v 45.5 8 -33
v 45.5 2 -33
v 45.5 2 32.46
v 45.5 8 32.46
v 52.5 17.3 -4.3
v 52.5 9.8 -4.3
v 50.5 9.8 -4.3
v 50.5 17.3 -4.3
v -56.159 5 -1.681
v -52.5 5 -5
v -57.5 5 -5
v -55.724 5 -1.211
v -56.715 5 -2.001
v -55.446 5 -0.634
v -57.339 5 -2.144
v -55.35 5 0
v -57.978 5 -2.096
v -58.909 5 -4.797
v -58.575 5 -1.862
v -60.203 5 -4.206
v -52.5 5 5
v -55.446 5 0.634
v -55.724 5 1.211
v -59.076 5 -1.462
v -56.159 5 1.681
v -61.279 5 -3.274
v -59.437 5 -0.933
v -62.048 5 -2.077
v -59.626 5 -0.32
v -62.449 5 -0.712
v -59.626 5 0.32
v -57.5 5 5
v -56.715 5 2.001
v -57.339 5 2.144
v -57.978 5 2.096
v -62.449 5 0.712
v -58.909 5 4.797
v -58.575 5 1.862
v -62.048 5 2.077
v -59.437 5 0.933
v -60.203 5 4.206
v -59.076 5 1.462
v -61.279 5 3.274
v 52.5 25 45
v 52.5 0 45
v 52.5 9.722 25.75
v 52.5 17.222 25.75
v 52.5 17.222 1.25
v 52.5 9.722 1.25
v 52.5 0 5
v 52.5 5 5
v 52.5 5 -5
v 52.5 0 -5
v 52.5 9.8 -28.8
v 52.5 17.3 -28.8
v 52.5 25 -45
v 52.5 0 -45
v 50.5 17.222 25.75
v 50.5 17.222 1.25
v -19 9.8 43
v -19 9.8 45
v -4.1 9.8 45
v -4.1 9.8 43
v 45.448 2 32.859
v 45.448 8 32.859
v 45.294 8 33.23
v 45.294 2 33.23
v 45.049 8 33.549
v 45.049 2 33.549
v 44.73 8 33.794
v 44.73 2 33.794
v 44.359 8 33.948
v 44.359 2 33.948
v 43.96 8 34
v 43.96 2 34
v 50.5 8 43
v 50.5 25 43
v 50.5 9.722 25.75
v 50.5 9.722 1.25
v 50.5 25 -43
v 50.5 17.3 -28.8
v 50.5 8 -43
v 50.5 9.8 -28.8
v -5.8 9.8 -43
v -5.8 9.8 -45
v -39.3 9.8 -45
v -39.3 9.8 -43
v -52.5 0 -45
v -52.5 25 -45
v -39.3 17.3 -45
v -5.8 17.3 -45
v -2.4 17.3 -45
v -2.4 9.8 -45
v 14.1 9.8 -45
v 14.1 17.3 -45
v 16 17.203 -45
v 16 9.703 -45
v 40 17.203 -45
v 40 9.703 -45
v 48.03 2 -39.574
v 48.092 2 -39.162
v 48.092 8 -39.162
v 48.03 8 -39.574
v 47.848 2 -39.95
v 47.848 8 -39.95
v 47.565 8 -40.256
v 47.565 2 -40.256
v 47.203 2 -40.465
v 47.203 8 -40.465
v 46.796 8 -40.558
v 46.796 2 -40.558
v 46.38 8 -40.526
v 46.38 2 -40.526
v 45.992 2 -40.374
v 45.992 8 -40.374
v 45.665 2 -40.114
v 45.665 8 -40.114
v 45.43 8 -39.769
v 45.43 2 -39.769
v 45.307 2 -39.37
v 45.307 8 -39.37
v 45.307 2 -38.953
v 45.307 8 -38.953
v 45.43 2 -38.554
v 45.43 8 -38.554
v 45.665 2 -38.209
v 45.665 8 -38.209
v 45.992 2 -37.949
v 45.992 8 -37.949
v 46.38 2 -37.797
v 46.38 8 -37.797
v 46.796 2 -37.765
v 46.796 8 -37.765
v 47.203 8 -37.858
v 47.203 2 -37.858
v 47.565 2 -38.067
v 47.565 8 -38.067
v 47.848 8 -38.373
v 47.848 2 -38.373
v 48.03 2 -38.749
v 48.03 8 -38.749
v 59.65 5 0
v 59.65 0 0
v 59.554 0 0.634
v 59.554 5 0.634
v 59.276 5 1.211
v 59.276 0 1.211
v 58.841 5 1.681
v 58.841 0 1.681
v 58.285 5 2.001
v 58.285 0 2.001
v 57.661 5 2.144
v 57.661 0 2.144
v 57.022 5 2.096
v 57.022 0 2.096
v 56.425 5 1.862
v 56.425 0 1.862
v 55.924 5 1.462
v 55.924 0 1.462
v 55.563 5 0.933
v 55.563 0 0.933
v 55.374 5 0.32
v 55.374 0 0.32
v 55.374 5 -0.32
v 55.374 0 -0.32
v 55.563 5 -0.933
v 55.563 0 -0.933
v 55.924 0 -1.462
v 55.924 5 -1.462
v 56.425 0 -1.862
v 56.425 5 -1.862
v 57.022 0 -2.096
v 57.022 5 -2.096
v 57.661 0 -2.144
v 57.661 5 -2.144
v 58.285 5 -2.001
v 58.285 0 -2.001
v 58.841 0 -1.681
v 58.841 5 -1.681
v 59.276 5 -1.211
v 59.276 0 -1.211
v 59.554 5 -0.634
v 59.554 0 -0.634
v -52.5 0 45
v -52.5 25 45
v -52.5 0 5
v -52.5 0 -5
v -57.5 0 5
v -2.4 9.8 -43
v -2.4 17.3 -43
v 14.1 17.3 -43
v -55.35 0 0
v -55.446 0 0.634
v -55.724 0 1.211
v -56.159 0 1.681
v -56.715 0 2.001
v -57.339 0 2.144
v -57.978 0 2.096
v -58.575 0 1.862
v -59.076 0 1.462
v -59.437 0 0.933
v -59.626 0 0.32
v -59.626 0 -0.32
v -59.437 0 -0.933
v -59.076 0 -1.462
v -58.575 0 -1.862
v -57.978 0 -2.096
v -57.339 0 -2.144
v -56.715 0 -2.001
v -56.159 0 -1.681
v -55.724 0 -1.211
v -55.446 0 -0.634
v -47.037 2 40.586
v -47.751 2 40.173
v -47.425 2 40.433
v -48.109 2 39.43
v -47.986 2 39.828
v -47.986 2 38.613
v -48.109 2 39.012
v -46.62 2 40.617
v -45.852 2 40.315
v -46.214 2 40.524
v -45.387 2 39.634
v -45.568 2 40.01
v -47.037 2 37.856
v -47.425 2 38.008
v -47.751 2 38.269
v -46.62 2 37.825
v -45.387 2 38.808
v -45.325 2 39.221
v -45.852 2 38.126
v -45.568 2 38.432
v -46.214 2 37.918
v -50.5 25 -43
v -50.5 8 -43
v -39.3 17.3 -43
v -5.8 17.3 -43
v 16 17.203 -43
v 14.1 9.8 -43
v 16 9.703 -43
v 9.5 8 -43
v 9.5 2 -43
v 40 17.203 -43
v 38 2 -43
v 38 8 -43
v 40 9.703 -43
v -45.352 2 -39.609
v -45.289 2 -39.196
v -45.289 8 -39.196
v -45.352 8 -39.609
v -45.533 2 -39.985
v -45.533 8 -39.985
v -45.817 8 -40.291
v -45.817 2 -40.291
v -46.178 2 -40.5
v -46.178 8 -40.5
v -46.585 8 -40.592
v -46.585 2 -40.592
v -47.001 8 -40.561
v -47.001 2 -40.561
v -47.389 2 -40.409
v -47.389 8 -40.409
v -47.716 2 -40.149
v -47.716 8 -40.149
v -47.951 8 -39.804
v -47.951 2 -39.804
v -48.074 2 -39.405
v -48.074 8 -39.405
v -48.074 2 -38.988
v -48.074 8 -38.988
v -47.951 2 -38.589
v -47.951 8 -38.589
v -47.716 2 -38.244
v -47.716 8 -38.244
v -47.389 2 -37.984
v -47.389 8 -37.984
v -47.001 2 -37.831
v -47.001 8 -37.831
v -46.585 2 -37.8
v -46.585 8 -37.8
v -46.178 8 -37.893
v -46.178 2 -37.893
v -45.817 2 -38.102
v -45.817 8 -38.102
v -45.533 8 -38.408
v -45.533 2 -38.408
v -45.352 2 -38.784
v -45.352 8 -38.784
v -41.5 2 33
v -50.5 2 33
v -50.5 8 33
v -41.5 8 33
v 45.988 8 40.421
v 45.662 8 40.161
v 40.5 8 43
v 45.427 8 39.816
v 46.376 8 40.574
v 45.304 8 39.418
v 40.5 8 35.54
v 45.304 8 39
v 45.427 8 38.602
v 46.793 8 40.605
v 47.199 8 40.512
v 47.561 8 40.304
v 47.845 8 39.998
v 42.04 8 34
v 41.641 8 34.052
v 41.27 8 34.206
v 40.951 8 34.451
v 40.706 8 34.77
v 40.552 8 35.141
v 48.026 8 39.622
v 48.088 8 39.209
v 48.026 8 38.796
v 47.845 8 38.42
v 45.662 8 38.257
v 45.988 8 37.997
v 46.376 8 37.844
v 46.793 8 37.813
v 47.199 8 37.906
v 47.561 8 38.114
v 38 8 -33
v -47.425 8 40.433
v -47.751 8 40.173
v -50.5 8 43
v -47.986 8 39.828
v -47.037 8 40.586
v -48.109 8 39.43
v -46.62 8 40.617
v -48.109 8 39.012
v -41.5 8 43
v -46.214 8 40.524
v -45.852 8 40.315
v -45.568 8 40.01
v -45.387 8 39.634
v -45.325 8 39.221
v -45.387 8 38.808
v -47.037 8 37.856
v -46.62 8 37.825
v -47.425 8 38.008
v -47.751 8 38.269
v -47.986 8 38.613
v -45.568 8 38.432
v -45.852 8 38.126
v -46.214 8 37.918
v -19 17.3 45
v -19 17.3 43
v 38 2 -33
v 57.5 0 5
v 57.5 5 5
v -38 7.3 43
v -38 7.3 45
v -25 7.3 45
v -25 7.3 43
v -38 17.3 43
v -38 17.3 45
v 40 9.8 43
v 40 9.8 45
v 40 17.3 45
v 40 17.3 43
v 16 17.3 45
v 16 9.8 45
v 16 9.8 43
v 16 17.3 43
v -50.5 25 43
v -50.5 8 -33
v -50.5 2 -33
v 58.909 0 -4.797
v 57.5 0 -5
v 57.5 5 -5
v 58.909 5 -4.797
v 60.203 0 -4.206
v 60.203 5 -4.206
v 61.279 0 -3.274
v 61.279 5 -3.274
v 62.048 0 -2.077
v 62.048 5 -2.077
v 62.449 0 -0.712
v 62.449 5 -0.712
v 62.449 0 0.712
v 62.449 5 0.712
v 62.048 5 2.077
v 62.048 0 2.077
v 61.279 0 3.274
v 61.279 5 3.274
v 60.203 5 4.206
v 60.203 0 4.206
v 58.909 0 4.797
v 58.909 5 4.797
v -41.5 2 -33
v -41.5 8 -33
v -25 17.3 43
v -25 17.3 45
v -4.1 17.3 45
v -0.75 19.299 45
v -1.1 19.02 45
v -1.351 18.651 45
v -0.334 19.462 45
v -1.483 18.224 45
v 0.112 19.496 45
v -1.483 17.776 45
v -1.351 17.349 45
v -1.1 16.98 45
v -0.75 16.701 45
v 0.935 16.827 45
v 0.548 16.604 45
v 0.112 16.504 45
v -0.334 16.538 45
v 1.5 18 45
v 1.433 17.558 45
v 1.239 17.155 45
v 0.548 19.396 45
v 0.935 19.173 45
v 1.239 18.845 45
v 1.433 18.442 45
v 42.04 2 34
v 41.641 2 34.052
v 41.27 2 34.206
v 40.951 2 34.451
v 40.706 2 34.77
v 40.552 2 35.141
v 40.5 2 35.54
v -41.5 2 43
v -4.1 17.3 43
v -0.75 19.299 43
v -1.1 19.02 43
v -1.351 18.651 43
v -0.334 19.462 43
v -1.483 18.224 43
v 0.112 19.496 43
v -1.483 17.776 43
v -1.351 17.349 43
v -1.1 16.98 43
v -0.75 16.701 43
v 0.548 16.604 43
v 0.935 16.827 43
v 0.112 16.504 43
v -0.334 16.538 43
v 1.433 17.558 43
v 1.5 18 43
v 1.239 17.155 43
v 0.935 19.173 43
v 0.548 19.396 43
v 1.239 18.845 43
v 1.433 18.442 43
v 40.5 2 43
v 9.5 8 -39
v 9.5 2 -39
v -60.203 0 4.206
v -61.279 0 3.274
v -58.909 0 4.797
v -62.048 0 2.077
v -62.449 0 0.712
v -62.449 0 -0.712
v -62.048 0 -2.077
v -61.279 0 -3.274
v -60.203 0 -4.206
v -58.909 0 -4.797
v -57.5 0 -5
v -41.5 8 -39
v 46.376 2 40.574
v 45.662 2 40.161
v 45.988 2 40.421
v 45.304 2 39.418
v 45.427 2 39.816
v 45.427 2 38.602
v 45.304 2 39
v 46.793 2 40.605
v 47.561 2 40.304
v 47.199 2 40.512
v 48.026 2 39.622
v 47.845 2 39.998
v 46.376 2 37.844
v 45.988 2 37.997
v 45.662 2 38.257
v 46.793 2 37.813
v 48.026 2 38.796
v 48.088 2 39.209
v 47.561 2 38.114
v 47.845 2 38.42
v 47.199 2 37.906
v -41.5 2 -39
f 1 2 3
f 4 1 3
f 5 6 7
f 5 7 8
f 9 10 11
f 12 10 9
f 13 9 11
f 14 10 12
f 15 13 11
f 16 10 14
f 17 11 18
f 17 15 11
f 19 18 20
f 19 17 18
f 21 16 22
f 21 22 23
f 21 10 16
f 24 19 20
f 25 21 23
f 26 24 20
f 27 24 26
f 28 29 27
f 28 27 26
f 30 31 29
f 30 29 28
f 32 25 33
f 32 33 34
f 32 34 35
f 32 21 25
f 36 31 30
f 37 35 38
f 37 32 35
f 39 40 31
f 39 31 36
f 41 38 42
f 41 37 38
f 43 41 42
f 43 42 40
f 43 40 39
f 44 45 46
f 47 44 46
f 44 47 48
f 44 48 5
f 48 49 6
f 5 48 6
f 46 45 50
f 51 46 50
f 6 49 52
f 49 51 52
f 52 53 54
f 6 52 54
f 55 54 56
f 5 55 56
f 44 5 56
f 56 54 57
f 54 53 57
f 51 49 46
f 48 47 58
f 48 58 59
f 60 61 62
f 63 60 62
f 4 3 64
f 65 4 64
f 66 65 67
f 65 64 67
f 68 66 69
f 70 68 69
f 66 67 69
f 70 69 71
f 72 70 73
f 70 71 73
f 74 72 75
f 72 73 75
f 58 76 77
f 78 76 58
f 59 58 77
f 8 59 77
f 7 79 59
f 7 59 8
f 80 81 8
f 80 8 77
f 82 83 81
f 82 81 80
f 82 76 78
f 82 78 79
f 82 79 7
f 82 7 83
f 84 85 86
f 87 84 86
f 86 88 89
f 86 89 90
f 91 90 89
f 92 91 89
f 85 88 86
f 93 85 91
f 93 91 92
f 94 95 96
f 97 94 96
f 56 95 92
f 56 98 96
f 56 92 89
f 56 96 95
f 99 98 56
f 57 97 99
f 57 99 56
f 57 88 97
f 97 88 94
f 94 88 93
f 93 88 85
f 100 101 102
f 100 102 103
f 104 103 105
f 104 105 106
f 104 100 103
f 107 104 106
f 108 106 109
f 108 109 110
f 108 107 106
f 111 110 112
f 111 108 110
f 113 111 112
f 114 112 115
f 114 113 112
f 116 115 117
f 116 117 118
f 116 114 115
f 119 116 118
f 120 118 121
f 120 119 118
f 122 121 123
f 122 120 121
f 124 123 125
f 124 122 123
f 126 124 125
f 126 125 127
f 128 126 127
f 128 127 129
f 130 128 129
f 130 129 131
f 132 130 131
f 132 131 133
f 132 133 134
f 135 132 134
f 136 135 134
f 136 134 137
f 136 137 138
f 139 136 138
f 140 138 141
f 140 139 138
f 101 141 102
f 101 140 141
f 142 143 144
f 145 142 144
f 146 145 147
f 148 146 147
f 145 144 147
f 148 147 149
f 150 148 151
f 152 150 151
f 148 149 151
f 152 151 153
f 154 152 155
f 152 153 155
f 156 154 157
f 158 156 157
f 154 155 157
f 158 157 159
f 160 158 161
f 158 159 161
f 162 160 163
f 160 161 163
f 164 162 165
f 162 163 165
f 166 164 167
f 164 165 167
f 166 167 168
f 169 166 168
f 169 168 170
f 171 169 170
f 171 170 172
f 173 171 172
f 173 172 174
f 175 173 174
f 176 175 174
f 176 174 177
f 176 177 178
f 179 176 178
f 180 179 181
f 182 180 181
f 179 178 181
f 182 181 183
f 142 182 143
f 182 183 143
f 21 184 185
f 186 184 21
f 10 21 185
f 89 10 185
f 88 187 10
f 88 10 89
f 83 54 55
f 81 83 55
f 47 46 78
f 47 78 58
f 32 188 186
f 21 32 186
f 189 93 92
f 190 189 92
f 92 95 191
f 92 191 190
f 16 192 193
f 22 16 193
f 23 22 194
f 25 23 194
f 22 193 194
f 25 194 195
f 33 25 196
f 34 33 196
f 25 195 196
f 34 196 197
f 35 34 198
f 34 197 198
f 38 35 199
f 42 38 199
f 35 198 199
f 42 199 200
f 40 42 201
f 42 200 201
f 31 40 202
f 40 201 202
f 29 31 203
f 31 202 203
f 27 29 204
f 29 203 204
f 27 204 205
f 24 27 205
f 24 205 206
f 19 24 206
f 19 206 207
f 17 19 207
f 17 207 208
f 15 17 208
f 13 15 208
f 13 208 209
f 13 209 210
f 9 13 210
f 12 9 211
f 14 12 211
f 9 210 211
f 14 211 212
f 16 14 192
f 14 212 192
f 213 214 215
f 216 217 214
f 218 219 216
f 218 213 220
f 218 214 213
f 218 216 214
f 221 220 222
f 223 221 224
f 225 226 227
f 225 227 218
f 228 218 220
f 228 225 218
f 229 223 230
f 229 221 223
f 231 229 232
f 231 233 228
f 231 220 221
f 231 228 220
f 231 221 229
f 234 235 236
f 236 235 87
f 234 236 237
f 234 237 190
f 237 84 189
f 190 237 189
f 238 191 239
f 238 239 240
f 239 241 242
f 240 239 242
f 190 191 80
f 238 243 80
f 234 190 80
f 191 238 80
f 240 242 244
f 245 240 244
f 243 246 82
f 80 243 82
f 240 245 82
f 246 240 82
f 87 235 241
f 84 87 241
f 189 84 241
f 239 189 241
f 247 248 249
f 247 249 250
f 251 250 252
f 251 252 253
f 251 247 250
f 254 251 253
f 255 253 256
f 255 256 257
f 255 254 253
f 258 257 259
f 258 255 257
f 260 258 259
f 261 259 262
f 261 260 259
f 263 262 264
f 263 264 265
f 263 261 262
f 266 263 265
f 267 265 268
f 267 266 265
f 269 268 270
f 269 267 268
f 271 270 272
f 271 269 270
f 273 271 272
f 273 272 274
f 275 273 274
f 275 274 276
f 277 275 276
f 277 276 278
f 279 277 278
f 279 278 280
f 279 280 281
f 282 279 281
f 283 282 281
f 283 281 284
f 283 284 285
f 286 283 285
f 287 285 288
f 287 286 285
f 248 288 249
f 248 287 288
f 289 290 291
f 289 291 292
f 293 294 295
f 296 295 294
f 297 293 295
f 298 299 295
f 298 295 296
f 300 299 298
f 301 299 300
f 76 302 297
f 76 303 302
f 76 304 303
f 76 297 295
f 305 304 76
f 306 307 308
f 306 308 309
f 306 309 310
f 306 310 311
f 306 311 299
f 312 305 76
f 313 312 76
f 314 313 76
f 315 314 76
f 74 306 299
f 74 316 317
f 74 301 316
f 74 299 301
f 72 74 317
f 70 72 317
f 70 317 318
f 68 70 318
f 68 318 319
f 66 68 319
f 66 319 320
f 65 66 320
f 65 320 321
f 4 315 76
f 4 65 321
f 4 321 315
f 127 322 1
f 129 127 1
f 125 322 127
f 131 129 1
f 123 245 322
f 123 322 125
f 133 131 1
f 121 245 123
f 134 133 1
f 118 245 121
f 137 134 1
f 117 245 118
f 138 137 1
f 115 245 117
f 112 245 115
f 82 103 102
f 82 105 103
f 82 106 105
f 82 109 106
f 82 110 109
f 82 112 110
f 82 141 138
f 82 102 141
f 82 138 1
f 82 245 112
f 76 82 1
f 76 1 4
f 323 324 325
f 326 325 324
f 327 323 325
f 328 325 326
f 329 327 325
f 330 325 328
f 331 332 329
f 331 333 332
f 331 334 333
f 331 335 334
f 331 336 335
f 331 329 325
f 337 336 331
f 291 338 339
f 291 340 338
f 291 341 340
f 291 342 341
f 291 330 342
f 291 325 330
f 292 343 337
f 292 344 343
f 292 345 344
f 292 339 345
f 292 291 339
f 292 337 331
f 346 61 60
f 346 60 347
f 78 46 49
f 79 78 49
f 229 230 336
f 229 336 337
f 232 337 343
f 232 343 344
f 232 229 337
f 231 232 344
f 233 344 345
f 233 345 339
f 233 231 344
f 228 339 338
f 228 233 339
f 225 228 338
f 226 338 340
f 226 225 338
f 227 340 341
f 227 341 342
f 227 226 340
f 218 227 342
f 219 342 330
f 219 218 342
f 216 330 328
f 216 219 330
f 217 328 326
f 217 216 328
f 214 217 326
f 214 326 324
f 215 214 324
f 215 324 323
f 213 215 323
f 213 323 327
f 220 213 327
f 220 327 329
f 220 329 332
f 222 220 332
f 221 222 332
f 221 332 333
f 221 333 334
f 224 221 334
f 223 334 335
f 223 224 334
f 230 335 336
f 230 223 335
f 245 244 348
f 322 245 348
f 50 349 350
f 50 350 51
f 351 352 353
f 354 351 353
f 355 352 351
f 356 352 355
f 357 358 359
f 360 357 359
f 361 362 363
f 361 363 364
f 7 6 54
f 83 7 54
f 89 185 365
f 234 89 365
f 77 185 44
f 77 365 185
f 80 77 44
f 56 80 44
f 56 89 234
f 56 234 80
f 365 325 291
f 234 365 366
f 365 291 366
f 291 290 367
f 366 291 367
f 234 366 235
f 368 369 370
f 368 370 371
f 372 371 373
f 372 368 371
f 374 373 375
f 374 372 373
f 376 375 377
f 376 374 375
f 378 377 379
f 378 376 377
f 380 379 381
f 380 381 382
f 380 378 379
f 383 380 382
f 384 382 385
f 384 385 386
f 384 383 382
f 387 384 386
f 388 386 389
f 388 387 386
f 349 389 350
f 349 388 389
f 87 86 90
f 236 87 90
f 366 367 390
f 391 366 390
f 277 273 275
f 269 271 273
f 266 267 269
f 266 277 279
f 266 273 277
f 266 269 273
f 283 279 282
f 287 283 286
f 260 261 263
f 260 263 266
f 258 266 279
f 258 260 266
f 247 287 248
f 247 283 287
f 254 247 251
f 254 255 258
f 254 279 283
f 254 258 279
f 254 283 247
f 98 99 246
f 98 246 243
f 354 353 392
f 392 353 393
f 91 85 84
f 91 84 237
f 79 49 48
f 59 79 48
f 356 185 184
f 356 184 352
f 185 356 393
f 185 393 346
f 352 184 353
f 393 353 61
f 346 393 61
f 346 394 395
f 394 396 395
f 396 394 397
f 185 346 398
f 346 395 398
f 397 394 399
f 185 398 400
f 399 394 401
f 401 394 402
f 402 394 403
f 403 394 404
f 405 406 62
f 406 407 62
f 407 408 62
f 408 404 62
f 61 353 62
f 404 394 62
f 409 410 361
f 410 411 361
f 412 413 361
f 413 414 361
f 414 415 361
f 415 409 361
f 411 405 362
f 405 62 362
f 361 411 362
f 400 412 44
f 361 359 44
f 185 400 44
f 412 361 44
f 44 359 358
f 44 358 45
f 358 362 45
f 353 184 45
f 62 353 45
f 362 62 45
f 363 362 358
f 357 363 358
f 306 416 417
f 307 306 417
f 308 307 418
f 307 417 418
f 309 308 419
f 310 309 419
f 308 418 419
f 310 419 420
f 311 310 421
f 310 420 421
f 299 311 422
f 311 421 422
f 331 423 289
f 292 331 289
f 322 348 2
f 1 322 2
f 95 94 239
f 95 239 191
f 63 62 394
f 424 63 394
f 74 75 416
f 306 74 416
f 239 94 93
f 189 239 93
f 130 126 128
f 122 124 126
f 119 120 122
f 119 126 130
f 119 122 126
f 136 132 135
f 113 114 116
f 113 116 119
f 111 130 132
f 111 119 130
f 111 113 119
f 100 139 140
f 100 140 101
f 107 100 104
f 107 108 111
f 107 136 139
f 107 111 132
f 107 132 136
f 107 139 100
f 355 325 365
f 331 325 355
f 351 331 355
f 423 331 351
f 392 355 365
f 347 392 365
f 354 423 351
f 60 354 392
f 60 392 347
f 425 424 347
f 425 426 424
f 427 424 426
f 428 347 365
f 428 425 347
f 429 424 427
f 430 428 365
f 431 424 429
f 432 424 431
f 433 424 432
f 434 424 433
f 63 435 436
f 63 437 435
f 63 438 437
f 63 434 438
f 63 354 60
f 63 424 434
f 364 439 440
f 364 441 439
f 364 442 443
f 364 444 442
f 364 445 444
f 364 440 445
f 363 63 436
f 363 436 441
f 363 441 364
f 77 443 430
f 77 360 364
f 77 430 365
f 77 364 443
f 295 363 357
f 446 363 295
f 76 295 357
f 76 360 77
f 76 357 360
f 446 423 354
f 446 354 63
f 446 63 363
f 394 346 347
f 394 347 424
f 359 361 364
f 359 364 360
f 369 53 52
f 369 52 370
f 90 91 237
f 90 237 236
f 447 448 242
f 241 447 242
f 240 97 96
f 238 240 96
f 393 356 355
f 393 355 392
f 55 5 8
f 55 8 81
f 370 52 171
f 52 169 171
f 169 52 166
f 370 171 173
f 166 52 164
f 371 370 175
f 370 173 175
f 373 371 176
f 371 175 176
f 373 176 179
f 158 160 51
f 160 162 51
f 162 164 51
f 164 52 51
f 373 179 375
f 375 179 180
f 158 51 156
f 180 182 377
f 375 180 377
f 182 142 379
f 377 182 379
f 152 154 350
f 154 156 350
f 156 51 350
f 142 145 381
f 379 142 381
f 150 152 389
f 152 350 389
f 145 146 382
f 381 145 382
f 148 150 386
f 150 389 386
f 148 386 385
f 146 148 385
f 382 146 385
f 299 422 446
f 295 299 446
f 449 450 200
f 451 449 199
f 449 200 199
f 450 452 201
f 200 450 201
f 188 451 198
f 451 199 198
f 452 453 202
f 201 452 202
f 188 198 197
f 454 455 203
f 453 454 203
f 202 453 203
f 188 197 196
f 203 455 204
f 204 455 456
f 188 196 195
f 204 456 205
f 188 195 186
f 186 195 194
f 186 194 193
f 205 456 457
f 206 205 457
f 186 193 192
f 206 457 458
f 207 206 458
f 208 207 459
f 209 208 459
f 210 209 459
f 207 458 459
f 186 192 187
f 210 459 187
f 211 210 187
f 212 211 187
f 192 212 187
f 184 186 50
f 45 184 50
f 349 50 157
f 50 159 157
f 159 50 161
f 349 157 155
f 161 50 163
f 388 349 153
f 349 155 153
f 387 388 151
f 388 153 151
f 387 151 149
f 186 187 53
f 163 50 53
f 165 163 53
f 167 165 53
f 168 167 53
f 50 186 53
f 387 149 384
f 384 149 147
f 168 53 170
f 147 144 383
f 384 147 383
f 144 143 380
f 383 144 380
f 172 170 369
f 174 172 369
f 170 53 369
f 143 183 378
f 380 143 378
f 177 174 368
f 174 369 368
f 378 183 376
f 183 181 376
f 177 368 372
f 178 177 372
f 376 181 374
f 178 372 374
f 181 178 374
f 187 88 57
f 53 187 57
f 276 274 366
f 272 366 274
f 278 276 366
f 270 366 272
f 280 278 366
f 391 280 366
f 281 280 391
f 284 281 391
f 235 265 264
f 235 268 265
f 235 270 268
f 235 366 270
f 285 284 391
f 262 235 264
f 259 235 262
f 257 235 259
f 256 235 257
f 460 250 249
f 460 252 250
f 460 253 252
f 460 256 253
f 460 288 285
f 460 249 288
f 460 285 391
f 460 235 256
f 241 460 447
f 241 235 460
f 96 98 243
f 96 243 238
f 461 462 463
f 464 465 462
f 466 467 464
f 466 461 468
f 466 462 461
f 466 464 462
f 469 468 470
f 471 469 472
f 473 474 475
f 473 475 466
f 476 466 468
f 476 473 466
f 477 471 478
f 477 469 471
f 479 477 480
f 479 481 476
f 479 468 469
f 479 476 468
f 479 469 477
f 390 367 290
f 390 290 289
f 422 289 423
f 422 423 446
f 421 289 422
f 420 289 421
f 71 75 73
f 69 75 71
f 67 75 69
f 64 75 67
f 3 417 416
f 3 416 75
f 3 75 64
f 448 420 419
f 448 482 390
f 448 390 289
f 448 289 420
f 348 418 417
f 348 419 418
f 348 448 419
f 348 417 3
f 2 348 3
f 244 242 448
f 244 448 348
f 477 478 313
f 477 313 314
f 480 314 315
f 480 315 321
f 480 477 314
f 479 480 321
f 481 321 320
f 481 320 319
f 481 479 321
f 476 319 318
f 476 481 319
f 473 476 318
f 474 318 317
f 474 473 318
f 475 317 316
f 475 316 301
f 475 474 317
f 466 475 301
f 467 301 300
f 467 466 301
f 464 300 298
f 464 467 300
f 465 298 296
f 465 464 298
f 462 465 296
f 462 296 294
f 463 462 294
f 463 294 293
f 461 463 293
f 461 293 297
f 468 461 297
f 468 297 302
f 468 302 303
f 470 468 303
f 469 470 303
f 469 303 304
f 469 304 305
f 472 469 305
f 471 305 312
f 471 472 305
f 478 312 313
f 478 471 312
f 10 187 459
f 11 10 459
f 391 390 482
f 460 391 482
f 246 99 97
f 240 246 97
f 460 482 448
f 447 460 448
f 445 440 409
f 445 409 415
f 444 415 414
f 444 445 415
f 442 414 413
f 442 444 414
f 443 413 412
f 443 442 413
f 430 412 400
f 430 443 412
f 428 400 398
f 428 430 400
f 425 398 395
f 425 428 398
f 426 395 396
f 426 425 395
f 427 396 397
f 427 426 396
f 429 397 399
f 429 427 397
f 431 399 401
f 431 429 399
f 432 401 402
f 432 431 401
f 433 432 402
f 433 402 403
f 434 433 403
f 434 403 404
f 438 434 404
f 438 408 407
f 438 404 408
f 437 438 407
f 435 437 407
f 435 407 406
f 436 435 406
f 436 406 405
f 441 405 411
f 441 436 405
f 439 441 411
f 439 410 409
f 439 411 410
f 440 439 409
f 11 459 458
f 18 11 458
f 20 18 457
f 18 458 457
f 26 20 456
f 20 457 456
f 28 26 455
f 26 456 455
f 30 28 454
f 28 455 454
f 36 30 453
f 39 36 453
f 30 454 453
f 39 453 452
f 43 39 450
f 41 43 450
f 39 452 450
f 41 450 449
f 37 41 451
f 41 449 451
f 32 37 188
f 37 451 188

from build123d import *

# Parameters (mm, degrees)
SKETCH_1_W          = 105
SKETCH_1_H          = 90
EXTRUDE_1_DEPTH     = 25
SHELL_1_T           = -2
SKETCH_8_R          = 2.15
EXTRUDE_3_DEPTH     = 5
SKETCH_3_W          = 24
SKETCH_3_H          = 7.5
SKETCH_3_W_2        = 14.9
CUT_EXTRUDE_2_DEPTH = 10
SKETCH_5_W          = 24.5
SKETCH_5_H          = 7.5
CUT_EXTRUDE_3_DEPTH = 10
SKETCH_7_W          = 33.5
SKETCH_7_H          = 7.5
SKETCH_7_W_2        = 16.5
SKETCH_7_W_3        = 24
CUT_EXTRUDE_4_DEPTH = 10
SKETCH_9_R          = 1.5
CUT_EXTRUDE_5_DEPTH = 50
SKETCH_2_R          = 1.4
SKETCH_2_W          = 9
SKETCH_2_H          = 10
EXTRUDE_6_DEPTH     = 6
SKETCH_3_8_W        = 24
SKETCH_3_8_H        = 7.5
SKETCH_3_8_W_2      = 14.9
SKETCH_3_8_W_3      = 13
SKETCH_3_8_H_2      = 10
CUT_EXTRUDE_6_DEPTH = 10


with BuildPart() as part:
    # 草图1 → 凸台-拉伸1 (new body)
    with BuildSketch(Plane(origin=(0, 0, 0), x_dir=(1, 0, 0), z_dir=(0, 1, 0))):
        Rectangle(SKETCH_1_W, SKETCH_1_H)
    extrude(amount=EXTRUDE_1_DEPTH)

    # 抽壳1
    shell_1_openings = [part.faces().sort_by_distance(p)[0] for p in [
        (0, 25, 0),
    ]]
    offset(amount=SHELL_1_T, openings=shell_1_openings, kind=Kind.INTERSECTION)

    # 草图8 → 凸台-拉伸3 (add)
    # profile 1 of 2: a face of its own
    with BuildSketch(Plane.XZ):
        with BuildLine():
            Line((-57.5, 5), (-52.5, 5))
            Line((-52.5, 5), (-52.5, -5))
            Line((-52.5, -5), (-57.5, -5))
            ThreePointArc((-57.5, -5), (-62.5, 0), (-57.5, 5))
        make_face()
        with Locations((-57.5, 0)):
            Circle(SKETCH_8_R, mode=Mode.SUBTRACT)
    # profile 2 of 2: a face of its own
    with BuildSketch(Plane.XZ):
        with BuildLine():
            Line((52.5, -5), (57.5, -5))
            ThreePointArc((57.5, -5), (62.5, 0), (57.5, 5))
            Line((57.5, 5), (52.5, 5))
            Line((52.5, 5), (52.5, -5))
        make_face()
        with Locations((57.5, 0)):
            Circle(SKETCH_8_R, mode=Mode.SUBTRACT)
    extrude(amount=-EXTRUDE_3_DEPTH)

    # 草图3 → 切除-拉伸2 (cut)
    with BuildSketch(Plane.XY.offset(45)):
        with Locations((28, 13.55)):
            Rectangle(SKETCH_3_W, SKETCH_3_H)
        with Locations((-11.55, 13.55)):
            Rectangle(SKETCH_3_W_2, SKETCH_3_H)
    extrude(amount=-CUT_EXTRUDE_2_DEPTH, mode=Mode.SUBTRACT)

    # 草图5 → 切除-拉伸3 (cut)
    with BuildSketch(Plane(origin=(52.5, 0, 0), x_dir=(0, 0, -1), z_dir=(1, 0, 0))):
        with Locations((16.55, 13.55)):
            Rectangle(SKETCH_5_W, SKETCH_5_H)
        with Locations((-13.5, 13.471843212)):
            Rectangle(SKETCH_5_W, SKETCH_5_H)
    extrude(amount=-CUT_EXTRUDE_3_DEPTH, mode=Mode.SUBTRACT)

    # 草图7 → 切除-拉伸4 (cut)
    with BuildSketch(Plane(origin=(0, 0, -45), x_dir=(-1, 0, 0), z_dir=(0, 0, -1))):
        with Locations((22.55, 13.55)):
            Rectangle(SKETCH_7_W, SKETCH_7_H)
        with Locations((-5.85, 13.55)):
            Rectangle(SKETCH_7_W_2, SKETCH_7_H)
        with Locations((-28, 13.452632976)):
            Rectangle(SKETCH_7_W_3, SKETCH_7_H)
    extrude(amount=-CUT_EXTRUDE_4_DEPTH, mode=Mode.SUBTRACT)

    # 草图9 → 切除-拉伸5 (cut)
    with BuildSketch(Plane.XY):
        with Locations((0, 18)):
            Circle(SKETCH_9_R)
    extrude(amount=CUT_EXTRUDE_5_DEPTH, mode=Mode.SUBTRACT)

    # 草图2 → 凸台-拉伸6 (add)
    # profile 1 of 3: a face of its own
    with BuildSketch(Plane(origin=(0, 2, 0), x_dir=(1, 0, 0), z_dir=(0, 1, 0))):
        Polygon((-41.5, 33), (-41.5, 39), (9.5, 39), (9.5, 43), (-50.5, 43), (-50.5, 33), align=None)
        with Locations((-46.689481309, 39.196373095)):
            Circle(SKETCH_2_R, mode=Mode.SUBTRACT)
    # profile 2 of 3: a face of its own
    with BuildSketch(Plane(origin=(0, 2, 0), x_dir=(1, 0, 0), z_dir=(0, 1, 0))):
        with Locations((-46, -38)):
            Rectangle(SKETCH_2_W, SKETCH_2_H)
        with Locations((-46.725108279, -39.220894808)):
            Circle(SKETCH_2_R, mode=Mode.SUBTRACT)
    # profile 3 of 3: a face of its own
    with BuildSketch(Plane(origin=(0, 2, 0), x_dir=(1, 0, 0), z_dir=(0, 1, 0))):
        with BuildLine():
            Line((50.5, 43), (38, 43))
            Line((38, 43), (38, 33))
            Line((38, 33), (45.5, 33))
            Line((45.5, 33), (45.5, -32.46))
            ThreePointArc((45.5, -32.46), (45.048944443, -33.548944443), (43.96, -34))
            Line((43.96, -34), (42.04, -34))
            ThreePointArc((42.04, -34), (40.951055557, -34.451055557), (40.5, -35.54))
            Line((40.5, -35.54), (40.5, -43))
            Line((40.5, -43), (50.5, -43))
            Line((50.5, -43), (50.5, 43))
        make_face()
        with Locations((46.687886977, -39.208970538)):
            Circle(SKETCH_2_R, mode=Mode.SUBTRACT)
        with Locations((46.691741848, 39.161577941)):
            Circle(SKETCH_2_R, mode=Mode.SUBTRACT)
    extrude(amount=EXTRUDE_6_DEPTH)

    # 草图3<8> → 切除-拉伸6 (cut)
    with BuildSketch(Plane.XY.offset(45)):
        with Locations((28, 13.55)):
            Rectangle(SKETCH_3_8_W, SKETCH_3_8_H)
        with Locations((-11.55, 13.55)):
            Rectangle(SKETCH_3_8_W_2, SKETCH_3_8_H)
        with Locations((-31.5, 12.3)):
            Rectangle(SKETCH_3_8_W_3, SKETCH_3_8_H_2)
    extrude(amount=-CUT_EXTRUDE_6_DEPTH, mode=Mode.SUBTRACT)


solid = part.part
